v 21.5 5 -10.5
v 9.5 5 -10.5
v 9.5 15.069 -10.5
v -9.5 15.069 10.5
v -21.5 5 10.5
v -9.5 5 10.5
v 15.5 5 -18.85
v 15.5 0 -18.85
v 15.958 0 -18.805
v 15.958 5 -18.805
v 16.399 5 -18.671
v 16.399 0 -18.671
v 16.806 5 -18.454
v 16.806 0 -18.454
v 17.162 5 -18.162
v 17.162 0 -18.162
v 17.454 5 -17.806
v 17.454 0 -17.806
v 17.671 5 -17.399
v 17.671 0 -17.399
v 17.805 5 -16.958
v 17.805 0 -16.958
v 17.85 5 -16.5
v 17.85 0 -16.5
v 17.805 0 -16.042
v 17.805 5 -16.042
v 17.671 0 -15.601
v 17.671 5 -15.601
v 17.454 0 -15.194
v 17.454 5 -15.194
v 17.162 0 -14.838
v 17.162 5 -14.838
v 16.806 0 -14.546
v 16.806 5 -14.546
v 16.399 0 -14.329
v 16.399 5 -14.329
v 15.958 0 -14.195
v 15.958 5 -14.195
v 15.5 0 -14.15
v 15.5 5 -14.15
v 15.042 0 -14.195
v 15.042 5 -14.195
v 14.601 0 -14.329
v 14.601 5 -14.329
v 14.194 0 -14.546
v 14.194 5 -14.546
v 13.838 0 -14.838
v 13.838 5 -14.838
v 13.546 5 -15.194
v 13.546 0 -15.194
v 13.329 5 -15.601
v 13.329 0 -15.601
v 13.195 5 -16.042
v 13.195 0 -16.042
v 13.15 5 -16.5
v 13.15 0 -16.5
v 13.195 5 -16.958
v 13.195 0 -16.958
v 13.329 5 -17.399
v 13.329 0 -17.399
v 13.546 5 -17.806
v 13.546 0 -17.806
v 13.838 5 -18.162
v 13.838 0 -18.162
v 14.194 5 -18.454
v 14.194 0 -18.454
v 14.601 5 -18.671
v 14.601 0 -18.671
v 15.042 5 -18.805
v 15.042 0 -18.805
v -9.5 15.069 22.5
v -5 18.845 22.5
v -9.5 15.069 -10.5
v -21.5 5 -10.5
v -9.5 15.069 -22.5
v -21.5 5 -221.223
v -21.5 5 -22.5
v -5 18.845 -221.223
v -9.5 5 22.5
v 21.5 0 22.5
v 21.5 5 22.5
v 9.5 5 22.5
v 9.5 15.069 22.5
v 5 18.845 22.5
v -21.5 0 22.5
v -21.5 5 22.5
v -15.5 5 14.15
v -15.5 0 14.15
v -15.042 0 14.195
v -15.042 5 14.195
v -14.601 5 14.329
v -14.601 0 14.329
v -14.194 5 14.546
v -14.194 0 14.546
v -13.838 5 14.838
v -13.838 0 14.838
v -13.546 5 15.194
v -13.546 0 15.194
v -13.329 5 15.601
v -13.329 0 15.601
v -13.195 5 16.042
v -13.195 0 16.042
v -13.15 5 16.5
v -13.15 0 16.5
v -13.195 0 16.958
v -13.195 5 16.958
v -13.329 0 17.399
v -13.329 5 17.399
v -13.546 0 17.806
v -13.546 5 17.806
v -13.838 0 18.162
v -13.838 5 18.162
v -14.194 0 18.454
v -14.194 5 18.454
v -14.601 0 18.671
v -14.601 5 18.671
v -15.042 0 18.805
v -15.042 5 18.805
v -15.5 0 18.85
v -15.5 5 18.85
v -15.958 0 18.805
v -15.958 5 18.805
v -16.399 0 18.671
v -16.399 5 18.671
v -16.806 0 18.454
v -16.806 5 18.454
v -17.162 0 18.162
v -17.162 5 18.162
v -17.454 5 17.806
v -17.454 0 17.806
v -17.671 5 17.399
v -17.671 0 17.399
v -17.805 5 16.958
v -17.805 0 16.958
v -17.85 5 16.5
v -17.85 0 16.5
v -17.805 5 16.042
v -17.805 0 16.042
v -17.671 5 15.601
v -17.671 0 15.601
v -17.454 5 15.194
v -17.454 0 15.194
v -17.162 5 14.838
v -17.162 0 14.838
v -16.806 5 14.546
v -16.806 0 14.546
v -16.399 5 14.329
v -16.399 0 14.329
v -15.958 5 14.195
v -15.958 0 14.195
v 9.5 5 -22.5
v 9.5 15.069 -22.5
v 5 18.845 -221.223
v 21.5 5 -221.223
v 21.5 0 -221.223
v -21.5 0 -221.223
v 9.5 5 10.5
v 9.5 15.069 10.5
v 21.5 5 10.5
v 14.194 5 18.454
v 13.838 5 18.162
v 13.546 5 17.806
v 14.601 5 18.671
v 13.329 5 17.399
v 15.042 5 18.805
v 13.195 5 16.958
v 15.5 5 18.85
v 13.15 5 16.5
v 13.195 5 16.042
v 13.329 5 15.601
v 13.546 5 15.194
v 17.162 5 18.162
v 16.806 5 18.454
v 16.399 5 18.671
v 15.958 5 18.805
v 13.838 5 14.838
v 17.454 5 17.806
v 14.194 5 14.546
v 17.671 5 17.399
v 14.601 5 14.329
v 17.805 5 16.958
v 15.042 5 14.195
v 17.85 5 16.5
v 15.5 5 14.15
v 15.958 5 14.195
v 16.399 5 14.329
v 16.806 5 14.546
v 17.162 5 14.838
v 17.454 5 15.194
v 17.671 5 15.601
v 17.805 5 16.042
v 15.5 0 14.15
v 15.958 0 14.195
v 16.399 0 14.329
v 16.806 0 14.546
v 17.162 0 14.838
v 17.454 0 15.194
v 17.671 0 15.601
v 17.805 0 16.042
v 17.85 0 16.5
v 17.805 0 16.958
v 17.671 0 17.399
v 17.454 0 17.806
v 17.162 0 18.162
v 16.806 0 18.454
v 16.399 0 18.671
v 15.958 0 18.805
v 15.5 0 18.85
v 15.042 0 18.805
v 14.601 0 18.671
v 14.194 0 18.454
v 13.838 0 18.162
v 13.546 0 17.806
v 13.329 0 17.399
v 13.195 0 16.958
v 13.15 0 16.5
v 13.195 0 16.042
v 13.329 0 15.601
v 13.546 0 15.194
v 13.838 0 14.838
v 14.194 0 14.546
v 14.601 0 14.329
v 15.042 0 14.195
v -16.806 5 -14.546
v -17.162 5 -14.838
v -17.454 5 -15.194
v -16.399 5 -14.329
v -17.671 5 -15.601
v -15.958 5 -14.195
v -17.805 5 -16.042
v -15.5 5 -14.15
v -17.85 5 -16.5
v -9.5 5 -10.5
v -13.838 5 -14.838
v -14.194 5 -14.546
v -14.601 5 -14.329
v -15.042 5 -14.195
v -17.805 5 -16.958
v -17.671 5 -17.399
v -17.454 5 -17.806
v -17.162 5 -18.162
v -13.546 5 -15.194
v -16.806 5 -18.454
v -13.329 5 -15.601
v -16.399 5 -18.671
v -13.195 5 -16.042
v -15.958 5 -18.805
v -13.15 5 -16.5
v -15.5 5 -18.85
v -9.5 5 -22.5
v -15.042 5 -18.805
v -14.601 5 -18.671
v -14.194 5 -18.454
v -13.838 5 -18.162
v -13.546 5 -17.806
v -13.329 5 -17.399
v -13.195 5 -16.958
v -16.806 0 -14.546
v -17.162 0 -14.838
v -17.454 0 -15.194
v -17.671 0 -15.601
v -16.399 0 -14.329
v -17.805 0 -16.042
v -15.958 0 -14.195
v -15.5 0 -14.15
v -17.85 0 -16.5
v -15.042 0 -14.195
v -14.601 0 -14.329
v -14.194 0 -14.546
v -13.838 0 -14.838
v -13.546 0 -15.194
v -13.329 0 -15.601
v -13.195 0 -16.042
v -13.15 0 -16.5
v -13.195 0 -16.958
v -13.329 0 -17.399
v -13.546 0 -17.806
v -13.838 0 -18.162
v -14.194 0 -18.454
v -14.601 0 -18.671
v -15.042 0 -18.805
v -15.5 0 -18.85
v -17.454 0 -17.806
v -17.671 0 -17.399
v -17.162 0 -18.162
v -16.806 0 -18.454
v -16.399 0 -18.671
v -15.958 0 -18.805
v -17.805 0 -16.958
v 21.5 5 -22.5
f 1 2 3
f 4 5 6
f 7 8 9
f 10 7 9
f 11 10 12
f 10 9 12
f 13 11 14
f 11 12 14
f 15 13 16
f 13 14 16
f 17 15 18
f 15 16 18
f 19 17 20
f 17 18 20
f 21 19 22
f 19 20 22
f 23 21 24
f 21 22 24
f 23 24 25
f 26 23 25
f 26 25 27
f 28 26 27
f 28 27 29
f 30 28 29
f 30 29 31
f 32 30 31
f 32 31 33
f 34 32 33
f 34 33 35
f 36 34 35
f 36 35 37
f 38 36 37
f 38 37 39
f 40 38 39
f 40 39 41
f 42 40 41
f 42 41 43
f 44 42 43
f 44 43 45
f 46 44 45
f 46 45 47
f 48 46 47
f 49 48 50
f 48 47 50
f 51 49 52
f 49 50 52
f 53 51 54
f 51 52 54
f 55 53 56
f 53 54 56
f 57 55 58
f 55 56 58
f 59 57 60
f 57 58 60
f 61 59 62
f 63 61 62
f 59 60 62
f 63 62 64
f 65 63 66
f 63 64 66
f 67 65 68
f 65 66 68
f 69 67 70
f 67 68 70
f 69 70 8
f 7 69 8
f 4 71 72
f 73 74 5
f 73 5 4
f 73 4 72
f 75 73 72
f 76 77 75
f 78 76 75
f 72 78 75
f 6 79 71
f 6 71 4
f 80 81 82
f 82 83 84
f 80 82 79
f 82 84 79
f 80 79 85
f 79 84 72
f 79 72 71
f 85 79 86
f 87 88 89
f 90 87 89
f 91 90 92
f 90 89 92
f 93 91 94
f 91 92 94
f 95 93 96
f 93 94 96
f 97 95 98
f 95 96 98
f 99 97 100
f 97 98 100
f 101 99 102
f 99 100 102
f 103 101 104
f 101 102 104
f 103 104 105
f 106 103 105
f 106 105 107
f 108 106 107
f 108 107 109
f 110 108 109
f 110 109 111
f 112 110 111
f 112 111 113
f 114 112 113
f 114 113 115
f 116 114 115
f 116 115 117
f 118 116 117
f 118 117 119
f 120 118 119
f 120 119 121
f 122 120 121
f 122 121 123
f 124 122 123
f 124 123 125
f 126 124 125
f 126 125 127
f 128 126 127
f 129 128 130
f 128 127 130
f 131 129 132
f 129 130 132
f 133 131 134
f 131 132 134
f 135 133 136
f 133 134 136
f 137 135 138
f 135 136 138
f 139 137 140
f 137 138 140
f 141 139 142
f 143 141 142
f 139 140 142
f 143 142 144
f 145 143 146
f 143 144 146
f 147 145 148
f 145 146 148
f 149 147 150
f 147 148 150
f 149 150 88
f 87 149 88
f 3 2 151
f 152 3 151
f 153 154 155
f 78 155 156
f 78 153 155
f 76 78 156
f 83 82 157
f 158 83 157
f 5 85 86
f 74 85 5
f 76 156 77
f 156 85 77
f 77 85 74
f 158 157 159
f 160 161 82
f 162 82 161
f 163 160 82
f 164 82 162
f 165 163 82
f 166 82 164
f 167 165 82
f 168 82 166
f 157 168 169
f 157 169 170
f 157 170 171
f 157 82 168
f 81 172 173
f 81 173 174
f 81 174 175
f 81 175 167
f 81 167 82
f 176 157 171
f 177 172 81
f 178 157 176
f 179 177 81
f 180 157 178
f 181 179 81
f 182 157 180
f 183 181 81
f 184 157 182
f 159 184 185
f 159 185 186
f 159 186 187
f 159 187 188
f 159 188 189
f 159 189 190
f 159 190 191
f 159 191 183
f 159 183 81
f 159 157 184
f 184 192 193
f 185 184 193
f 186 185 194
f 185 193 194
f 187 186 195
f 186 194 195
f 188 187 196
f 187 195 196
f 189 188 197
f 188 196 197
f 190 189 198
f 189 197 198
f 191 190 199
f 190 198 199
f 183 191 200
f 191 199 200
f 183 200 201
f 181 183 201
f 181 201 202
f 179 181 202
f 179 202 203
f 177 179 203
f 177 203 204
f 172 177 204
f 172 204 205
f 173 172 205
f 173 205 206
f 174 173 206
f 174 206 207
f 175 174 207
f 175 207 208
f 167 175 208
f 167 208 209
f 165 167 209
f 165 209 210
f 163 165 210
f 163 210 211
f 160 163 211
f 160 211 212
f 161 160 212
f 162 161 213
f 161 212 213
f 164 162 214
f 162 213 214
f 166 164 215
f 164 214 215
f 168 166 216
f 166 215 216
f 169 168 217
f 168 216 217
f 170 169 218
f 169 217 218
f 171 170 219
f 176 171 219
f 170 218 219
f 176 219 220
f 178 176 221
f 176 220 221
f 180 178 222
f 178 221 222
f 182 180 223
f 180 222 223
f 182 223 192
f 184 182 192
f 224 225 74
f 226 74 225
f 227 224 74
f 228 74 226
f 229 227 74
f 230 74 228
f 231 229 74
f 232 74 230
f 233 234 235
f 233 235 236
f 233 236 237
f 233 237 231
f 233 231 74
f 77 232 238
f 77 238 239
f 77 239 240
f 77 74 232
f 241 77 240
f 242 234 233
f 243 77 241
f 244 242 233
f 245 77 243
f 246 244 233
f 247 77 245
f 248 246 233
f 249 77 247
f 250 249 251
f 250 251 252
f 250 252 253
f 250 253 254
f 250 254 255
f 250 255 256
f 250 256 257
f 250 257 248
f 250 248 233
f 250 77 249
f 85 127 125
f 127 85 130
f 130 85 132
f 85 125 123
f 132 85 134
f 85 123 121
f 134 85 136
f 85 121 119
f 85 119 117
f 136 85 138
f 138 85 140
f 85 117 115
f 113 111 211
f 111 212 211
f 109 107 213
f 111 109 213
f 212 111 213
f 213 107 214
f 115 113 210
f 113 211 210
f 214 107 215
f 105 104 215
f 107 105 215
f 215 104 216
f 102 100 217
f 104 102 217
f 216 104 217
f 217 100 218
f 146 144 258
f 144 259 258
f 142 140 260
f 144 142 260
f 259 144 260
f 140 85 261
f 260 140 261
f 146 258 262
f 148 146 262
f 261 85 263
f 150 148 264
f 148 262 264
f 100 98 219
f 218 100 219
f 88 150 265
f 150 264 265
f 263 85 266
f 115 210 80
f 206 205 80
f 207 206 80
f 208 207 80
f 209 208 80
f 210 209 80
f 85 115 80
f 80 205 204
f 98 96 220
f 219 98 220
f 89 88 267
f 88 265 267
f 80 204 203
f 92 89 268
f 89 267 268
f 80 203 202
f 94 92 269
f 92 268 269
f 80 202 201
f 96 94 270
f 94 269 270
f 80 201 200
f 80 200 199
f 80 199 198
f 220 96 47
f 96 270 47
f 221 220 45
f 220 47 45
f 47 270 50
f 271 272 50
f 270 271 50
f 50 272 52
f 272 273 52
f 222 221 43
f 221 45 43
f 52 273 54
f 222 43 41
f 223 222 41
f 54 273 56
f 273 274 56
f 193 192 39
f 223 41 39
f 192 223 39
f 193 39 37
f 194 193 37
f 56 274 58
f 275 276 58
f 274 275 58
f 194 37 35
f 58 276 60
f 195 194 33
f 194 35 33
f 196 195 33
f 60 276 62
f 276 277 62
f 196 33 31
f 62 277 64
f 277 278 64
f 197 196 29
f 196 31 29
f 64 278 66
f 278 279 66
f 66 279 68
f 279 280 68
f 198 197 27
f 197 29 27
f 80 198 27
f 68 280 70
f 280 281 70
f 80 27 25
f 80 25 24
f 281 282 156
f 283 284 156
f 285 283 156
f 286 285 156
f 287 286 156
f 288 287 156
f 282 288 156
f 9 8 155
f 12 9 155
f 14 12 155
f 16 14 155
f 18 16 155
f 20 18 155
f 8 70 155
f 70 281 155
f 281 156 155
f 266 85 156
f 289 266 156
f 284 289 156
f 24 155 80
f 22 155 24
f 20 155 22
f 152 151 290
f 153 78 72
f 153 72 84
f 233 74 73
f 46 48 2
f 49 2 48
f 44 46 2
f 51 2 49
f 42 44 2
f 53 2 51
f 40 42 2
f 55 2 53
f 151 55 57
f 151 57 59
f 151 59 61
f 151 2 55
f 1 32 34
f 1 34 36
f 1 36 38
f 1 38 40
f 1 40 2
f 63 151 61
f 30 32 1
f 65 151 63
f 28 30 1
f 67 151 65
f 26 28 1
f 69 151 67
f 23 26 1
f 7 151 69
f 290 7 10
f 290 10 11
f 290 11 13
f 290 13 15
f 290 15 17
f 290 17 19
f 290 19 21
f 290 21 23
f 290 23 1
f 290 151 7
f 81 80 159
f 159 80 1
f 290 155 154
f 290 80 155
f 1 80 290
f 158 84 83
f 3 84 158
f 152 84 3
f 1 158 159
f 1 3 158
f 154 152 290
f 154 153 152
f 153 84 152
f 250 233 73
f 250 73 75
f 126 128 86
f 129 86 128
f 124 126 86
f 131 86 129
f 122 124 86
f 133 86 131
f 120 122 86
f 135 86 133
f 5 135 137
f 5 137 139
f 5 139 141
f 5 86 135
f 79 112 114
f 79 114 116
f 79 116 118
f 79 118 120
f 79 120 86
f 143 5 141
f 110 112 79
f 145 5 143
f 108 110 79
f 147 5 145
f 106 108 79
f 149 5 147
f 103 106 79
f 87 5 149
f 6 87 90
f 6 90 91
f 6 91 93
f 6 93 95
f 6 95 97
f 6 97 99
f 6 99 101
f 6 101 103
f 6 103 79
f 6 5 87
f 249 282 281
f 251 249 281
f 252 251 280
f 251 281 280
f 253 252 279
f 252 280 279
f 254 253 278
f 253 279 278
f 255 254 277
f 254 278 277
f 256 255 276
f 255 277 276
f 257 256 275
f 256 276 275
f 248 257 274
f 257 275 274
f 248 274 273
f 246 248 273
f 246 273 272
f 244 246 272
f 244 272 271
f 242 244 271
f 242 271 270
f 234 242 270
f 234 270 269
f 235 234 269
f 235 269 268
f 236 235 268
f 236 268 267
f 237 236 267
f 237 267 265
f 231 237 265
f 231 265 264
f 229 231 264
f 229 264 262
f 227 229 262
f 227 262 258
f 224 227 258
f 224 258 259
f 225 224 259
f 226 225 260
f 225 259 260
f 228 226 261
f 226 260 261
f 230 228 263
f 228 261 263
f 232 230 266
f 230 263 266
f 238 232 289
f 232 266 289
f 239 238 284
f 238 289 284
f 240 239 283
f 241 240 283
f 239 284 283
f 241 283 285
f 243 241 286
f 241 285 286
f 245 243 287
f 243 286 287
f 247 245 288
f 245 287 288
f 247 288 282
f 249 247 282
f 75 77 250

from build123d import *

# Parameters (mm, degrees)
SKETCH1_W                = 43
SKETCH1_H                = 45
BOSS_EXTRUDE1_DEPTH      = 5
BOSS_EXTRUDE2_DEPTH      = 22.5
BOSS_EXTRUDE2_DEPTH_BACK = 221.22316262
SKETCH4_W                = 43
SKETCH4_H                = 5
SKETCH5_R                = 2.35
CUT_EXTRUDE2_DEPTH       = 224.06294432
CUT_EXTRUDE3_START       = -13.845143914
CUT_EXTRUDE3_OUTLINE_W   = 12
CUT_EXTRUDE3_OUTLINE_H   = 12
CUT_EXTRUDE3_OUTLINE_R   = 2.35
CUT_EXTRUDE3_DEPTH       = 10.069195574


# Read off the part's stored shape, not the designer's step: Cut-Extrude3
with BuildPart() as part:
    # Sketch1 → Boss-Extrude1 (new body)
    with BuildSketch(Plane(origin=(0, 0, 0), x_dir=(1, 0, 0), z_dir=(0, 1, 0))):
        Rectangle(SKETCH1_W, SKETCH1_H)
    extrude(amount=BOSS_EXTRUDE1_DEPTH)

    # Sketch4 → Boss-Extrude2 (add, two sides: drawn at the far end of the back side and taken through both)
    with BuildSketch(Plane.XY.offset(-BOSS_EXTRUDE2_DEPTH_BACK)):
        Polygon((21.5, 5), (-21.5, 5), (-5, 18.845143914), (5, 18.845143914), align=None)
        with Locations((0, 2.5)):
            Rectangle(SKETCH4_W, SKETCH4_H)
    extrude(amount=BOSS_EXTRUDE2_DEPTH + BOSS_EXTRUDE2_DEPTH_BACK)

    # Sketch5 → Cut-Extrude2 (cut, through all)
    with BuildSketch(Plane.XZ):
        with Locations(Location((15.5, -16.5, 0), (0, 0, 270))):
            Circle(SKETCH5_R)
        with Locations(Location((-15.5, -16.5, 0), (0, 0, 270))):
            Circle(SKETCH5_R)
        with Locations(Location((-15.5, 16.5, 0), (0, 0, 270))):
            Circle(SKETCH5_R)
        with Locations(Location((15.5, 16.5, 0), (0, 0, 270))):
            Circle(SKETCH5_R)
    extrude(amount=-CUT_EXTRUDE2_DEPTH, mode=Mode.SUBTRACT)

    # Cut-Extrude3 outline → Cut-Extrude3 (cut)
    # profile 1 of 4: a face of its own
    with BuildSketch(Plane(origin=(0, 18.845143914, 0), x_dir=(1, 0, 0), z_dir=(0, 1, 0)).offset(CUT_EXTRUDE3_START)):
        with Locations((-15.5, 16.5)):
            Rectangle(CUT_EXTRUDE3_OUTLINE_W, CUT_EXTRUDE3_OUTLINE_H)
        with Locations((-15.5, 16.5)):
            Circle(CUT_EXTRUDE3_OUTLINE_R, mode=Mode.SUBTRACT)
    # profile 2 of 4: a face of its own
    with BuildSketch(Plane(origin=(0, 18.845143914, 0), x_dir=(1, 0, 0), z_dir=(0, 1, 0)).offset(CUT_EXTRUDE3_START)):
        with Locations((-15.5, -16.5)):
            Rectangle(CUT_EXTRUDE3_OUTLINE_W, CUT_EXTRUDE3_OUTLINE_H)
        with Locations((-15.5, -16.5)):
            Circle(CUT_EXTRUDE3_OUTLINE_R, mode=Mode.SUBTRACT)
    # profile 3 of 4: a face of its own
    with BuildSketch(Plane(origin=(0, 18.845143914, 0), x_dir=(1, 0, 0), z_dir=(0, 1, 0)).offset(CUT_EXTRUDE3_START)):
        with Locations((15.5, 16.5)):
            Rectangle(CUT_EXTRUDE3_OUTLINE_W, CUT_EXTRUDE3_OUTLINE_H)
        with Locations((15.5, 16.5)):
            Circle(CUT_EXTRUDE3_OUTLINE_R, mode=Mode.SUBTRACT)
    # profile 4 of 4: a face of its own
    with BuildSketch(Plane(origin=(0, 18.845143914, 0), x_dir=(1, 0, 0), z_dir=(0, 1, 0)).offset(CUT_EXTRUDE3_START)):
        with Locations((15.5, -16.5)):
            Rectangle(CUT_EXTRUDE3_OUTLINE_W, CUT_EXTRUDE3_OUTLINE_H)
        with Locations((15.5, -16.5)):
            Circle(CUT_EXTRUDE3_OUTLINE_R, mode=Mode.SUBTRACT)
    extrude(amount=CUT_EXTRUDE3_DEPTH, mode=Mode.SUBTRACT)


solid = part.part
